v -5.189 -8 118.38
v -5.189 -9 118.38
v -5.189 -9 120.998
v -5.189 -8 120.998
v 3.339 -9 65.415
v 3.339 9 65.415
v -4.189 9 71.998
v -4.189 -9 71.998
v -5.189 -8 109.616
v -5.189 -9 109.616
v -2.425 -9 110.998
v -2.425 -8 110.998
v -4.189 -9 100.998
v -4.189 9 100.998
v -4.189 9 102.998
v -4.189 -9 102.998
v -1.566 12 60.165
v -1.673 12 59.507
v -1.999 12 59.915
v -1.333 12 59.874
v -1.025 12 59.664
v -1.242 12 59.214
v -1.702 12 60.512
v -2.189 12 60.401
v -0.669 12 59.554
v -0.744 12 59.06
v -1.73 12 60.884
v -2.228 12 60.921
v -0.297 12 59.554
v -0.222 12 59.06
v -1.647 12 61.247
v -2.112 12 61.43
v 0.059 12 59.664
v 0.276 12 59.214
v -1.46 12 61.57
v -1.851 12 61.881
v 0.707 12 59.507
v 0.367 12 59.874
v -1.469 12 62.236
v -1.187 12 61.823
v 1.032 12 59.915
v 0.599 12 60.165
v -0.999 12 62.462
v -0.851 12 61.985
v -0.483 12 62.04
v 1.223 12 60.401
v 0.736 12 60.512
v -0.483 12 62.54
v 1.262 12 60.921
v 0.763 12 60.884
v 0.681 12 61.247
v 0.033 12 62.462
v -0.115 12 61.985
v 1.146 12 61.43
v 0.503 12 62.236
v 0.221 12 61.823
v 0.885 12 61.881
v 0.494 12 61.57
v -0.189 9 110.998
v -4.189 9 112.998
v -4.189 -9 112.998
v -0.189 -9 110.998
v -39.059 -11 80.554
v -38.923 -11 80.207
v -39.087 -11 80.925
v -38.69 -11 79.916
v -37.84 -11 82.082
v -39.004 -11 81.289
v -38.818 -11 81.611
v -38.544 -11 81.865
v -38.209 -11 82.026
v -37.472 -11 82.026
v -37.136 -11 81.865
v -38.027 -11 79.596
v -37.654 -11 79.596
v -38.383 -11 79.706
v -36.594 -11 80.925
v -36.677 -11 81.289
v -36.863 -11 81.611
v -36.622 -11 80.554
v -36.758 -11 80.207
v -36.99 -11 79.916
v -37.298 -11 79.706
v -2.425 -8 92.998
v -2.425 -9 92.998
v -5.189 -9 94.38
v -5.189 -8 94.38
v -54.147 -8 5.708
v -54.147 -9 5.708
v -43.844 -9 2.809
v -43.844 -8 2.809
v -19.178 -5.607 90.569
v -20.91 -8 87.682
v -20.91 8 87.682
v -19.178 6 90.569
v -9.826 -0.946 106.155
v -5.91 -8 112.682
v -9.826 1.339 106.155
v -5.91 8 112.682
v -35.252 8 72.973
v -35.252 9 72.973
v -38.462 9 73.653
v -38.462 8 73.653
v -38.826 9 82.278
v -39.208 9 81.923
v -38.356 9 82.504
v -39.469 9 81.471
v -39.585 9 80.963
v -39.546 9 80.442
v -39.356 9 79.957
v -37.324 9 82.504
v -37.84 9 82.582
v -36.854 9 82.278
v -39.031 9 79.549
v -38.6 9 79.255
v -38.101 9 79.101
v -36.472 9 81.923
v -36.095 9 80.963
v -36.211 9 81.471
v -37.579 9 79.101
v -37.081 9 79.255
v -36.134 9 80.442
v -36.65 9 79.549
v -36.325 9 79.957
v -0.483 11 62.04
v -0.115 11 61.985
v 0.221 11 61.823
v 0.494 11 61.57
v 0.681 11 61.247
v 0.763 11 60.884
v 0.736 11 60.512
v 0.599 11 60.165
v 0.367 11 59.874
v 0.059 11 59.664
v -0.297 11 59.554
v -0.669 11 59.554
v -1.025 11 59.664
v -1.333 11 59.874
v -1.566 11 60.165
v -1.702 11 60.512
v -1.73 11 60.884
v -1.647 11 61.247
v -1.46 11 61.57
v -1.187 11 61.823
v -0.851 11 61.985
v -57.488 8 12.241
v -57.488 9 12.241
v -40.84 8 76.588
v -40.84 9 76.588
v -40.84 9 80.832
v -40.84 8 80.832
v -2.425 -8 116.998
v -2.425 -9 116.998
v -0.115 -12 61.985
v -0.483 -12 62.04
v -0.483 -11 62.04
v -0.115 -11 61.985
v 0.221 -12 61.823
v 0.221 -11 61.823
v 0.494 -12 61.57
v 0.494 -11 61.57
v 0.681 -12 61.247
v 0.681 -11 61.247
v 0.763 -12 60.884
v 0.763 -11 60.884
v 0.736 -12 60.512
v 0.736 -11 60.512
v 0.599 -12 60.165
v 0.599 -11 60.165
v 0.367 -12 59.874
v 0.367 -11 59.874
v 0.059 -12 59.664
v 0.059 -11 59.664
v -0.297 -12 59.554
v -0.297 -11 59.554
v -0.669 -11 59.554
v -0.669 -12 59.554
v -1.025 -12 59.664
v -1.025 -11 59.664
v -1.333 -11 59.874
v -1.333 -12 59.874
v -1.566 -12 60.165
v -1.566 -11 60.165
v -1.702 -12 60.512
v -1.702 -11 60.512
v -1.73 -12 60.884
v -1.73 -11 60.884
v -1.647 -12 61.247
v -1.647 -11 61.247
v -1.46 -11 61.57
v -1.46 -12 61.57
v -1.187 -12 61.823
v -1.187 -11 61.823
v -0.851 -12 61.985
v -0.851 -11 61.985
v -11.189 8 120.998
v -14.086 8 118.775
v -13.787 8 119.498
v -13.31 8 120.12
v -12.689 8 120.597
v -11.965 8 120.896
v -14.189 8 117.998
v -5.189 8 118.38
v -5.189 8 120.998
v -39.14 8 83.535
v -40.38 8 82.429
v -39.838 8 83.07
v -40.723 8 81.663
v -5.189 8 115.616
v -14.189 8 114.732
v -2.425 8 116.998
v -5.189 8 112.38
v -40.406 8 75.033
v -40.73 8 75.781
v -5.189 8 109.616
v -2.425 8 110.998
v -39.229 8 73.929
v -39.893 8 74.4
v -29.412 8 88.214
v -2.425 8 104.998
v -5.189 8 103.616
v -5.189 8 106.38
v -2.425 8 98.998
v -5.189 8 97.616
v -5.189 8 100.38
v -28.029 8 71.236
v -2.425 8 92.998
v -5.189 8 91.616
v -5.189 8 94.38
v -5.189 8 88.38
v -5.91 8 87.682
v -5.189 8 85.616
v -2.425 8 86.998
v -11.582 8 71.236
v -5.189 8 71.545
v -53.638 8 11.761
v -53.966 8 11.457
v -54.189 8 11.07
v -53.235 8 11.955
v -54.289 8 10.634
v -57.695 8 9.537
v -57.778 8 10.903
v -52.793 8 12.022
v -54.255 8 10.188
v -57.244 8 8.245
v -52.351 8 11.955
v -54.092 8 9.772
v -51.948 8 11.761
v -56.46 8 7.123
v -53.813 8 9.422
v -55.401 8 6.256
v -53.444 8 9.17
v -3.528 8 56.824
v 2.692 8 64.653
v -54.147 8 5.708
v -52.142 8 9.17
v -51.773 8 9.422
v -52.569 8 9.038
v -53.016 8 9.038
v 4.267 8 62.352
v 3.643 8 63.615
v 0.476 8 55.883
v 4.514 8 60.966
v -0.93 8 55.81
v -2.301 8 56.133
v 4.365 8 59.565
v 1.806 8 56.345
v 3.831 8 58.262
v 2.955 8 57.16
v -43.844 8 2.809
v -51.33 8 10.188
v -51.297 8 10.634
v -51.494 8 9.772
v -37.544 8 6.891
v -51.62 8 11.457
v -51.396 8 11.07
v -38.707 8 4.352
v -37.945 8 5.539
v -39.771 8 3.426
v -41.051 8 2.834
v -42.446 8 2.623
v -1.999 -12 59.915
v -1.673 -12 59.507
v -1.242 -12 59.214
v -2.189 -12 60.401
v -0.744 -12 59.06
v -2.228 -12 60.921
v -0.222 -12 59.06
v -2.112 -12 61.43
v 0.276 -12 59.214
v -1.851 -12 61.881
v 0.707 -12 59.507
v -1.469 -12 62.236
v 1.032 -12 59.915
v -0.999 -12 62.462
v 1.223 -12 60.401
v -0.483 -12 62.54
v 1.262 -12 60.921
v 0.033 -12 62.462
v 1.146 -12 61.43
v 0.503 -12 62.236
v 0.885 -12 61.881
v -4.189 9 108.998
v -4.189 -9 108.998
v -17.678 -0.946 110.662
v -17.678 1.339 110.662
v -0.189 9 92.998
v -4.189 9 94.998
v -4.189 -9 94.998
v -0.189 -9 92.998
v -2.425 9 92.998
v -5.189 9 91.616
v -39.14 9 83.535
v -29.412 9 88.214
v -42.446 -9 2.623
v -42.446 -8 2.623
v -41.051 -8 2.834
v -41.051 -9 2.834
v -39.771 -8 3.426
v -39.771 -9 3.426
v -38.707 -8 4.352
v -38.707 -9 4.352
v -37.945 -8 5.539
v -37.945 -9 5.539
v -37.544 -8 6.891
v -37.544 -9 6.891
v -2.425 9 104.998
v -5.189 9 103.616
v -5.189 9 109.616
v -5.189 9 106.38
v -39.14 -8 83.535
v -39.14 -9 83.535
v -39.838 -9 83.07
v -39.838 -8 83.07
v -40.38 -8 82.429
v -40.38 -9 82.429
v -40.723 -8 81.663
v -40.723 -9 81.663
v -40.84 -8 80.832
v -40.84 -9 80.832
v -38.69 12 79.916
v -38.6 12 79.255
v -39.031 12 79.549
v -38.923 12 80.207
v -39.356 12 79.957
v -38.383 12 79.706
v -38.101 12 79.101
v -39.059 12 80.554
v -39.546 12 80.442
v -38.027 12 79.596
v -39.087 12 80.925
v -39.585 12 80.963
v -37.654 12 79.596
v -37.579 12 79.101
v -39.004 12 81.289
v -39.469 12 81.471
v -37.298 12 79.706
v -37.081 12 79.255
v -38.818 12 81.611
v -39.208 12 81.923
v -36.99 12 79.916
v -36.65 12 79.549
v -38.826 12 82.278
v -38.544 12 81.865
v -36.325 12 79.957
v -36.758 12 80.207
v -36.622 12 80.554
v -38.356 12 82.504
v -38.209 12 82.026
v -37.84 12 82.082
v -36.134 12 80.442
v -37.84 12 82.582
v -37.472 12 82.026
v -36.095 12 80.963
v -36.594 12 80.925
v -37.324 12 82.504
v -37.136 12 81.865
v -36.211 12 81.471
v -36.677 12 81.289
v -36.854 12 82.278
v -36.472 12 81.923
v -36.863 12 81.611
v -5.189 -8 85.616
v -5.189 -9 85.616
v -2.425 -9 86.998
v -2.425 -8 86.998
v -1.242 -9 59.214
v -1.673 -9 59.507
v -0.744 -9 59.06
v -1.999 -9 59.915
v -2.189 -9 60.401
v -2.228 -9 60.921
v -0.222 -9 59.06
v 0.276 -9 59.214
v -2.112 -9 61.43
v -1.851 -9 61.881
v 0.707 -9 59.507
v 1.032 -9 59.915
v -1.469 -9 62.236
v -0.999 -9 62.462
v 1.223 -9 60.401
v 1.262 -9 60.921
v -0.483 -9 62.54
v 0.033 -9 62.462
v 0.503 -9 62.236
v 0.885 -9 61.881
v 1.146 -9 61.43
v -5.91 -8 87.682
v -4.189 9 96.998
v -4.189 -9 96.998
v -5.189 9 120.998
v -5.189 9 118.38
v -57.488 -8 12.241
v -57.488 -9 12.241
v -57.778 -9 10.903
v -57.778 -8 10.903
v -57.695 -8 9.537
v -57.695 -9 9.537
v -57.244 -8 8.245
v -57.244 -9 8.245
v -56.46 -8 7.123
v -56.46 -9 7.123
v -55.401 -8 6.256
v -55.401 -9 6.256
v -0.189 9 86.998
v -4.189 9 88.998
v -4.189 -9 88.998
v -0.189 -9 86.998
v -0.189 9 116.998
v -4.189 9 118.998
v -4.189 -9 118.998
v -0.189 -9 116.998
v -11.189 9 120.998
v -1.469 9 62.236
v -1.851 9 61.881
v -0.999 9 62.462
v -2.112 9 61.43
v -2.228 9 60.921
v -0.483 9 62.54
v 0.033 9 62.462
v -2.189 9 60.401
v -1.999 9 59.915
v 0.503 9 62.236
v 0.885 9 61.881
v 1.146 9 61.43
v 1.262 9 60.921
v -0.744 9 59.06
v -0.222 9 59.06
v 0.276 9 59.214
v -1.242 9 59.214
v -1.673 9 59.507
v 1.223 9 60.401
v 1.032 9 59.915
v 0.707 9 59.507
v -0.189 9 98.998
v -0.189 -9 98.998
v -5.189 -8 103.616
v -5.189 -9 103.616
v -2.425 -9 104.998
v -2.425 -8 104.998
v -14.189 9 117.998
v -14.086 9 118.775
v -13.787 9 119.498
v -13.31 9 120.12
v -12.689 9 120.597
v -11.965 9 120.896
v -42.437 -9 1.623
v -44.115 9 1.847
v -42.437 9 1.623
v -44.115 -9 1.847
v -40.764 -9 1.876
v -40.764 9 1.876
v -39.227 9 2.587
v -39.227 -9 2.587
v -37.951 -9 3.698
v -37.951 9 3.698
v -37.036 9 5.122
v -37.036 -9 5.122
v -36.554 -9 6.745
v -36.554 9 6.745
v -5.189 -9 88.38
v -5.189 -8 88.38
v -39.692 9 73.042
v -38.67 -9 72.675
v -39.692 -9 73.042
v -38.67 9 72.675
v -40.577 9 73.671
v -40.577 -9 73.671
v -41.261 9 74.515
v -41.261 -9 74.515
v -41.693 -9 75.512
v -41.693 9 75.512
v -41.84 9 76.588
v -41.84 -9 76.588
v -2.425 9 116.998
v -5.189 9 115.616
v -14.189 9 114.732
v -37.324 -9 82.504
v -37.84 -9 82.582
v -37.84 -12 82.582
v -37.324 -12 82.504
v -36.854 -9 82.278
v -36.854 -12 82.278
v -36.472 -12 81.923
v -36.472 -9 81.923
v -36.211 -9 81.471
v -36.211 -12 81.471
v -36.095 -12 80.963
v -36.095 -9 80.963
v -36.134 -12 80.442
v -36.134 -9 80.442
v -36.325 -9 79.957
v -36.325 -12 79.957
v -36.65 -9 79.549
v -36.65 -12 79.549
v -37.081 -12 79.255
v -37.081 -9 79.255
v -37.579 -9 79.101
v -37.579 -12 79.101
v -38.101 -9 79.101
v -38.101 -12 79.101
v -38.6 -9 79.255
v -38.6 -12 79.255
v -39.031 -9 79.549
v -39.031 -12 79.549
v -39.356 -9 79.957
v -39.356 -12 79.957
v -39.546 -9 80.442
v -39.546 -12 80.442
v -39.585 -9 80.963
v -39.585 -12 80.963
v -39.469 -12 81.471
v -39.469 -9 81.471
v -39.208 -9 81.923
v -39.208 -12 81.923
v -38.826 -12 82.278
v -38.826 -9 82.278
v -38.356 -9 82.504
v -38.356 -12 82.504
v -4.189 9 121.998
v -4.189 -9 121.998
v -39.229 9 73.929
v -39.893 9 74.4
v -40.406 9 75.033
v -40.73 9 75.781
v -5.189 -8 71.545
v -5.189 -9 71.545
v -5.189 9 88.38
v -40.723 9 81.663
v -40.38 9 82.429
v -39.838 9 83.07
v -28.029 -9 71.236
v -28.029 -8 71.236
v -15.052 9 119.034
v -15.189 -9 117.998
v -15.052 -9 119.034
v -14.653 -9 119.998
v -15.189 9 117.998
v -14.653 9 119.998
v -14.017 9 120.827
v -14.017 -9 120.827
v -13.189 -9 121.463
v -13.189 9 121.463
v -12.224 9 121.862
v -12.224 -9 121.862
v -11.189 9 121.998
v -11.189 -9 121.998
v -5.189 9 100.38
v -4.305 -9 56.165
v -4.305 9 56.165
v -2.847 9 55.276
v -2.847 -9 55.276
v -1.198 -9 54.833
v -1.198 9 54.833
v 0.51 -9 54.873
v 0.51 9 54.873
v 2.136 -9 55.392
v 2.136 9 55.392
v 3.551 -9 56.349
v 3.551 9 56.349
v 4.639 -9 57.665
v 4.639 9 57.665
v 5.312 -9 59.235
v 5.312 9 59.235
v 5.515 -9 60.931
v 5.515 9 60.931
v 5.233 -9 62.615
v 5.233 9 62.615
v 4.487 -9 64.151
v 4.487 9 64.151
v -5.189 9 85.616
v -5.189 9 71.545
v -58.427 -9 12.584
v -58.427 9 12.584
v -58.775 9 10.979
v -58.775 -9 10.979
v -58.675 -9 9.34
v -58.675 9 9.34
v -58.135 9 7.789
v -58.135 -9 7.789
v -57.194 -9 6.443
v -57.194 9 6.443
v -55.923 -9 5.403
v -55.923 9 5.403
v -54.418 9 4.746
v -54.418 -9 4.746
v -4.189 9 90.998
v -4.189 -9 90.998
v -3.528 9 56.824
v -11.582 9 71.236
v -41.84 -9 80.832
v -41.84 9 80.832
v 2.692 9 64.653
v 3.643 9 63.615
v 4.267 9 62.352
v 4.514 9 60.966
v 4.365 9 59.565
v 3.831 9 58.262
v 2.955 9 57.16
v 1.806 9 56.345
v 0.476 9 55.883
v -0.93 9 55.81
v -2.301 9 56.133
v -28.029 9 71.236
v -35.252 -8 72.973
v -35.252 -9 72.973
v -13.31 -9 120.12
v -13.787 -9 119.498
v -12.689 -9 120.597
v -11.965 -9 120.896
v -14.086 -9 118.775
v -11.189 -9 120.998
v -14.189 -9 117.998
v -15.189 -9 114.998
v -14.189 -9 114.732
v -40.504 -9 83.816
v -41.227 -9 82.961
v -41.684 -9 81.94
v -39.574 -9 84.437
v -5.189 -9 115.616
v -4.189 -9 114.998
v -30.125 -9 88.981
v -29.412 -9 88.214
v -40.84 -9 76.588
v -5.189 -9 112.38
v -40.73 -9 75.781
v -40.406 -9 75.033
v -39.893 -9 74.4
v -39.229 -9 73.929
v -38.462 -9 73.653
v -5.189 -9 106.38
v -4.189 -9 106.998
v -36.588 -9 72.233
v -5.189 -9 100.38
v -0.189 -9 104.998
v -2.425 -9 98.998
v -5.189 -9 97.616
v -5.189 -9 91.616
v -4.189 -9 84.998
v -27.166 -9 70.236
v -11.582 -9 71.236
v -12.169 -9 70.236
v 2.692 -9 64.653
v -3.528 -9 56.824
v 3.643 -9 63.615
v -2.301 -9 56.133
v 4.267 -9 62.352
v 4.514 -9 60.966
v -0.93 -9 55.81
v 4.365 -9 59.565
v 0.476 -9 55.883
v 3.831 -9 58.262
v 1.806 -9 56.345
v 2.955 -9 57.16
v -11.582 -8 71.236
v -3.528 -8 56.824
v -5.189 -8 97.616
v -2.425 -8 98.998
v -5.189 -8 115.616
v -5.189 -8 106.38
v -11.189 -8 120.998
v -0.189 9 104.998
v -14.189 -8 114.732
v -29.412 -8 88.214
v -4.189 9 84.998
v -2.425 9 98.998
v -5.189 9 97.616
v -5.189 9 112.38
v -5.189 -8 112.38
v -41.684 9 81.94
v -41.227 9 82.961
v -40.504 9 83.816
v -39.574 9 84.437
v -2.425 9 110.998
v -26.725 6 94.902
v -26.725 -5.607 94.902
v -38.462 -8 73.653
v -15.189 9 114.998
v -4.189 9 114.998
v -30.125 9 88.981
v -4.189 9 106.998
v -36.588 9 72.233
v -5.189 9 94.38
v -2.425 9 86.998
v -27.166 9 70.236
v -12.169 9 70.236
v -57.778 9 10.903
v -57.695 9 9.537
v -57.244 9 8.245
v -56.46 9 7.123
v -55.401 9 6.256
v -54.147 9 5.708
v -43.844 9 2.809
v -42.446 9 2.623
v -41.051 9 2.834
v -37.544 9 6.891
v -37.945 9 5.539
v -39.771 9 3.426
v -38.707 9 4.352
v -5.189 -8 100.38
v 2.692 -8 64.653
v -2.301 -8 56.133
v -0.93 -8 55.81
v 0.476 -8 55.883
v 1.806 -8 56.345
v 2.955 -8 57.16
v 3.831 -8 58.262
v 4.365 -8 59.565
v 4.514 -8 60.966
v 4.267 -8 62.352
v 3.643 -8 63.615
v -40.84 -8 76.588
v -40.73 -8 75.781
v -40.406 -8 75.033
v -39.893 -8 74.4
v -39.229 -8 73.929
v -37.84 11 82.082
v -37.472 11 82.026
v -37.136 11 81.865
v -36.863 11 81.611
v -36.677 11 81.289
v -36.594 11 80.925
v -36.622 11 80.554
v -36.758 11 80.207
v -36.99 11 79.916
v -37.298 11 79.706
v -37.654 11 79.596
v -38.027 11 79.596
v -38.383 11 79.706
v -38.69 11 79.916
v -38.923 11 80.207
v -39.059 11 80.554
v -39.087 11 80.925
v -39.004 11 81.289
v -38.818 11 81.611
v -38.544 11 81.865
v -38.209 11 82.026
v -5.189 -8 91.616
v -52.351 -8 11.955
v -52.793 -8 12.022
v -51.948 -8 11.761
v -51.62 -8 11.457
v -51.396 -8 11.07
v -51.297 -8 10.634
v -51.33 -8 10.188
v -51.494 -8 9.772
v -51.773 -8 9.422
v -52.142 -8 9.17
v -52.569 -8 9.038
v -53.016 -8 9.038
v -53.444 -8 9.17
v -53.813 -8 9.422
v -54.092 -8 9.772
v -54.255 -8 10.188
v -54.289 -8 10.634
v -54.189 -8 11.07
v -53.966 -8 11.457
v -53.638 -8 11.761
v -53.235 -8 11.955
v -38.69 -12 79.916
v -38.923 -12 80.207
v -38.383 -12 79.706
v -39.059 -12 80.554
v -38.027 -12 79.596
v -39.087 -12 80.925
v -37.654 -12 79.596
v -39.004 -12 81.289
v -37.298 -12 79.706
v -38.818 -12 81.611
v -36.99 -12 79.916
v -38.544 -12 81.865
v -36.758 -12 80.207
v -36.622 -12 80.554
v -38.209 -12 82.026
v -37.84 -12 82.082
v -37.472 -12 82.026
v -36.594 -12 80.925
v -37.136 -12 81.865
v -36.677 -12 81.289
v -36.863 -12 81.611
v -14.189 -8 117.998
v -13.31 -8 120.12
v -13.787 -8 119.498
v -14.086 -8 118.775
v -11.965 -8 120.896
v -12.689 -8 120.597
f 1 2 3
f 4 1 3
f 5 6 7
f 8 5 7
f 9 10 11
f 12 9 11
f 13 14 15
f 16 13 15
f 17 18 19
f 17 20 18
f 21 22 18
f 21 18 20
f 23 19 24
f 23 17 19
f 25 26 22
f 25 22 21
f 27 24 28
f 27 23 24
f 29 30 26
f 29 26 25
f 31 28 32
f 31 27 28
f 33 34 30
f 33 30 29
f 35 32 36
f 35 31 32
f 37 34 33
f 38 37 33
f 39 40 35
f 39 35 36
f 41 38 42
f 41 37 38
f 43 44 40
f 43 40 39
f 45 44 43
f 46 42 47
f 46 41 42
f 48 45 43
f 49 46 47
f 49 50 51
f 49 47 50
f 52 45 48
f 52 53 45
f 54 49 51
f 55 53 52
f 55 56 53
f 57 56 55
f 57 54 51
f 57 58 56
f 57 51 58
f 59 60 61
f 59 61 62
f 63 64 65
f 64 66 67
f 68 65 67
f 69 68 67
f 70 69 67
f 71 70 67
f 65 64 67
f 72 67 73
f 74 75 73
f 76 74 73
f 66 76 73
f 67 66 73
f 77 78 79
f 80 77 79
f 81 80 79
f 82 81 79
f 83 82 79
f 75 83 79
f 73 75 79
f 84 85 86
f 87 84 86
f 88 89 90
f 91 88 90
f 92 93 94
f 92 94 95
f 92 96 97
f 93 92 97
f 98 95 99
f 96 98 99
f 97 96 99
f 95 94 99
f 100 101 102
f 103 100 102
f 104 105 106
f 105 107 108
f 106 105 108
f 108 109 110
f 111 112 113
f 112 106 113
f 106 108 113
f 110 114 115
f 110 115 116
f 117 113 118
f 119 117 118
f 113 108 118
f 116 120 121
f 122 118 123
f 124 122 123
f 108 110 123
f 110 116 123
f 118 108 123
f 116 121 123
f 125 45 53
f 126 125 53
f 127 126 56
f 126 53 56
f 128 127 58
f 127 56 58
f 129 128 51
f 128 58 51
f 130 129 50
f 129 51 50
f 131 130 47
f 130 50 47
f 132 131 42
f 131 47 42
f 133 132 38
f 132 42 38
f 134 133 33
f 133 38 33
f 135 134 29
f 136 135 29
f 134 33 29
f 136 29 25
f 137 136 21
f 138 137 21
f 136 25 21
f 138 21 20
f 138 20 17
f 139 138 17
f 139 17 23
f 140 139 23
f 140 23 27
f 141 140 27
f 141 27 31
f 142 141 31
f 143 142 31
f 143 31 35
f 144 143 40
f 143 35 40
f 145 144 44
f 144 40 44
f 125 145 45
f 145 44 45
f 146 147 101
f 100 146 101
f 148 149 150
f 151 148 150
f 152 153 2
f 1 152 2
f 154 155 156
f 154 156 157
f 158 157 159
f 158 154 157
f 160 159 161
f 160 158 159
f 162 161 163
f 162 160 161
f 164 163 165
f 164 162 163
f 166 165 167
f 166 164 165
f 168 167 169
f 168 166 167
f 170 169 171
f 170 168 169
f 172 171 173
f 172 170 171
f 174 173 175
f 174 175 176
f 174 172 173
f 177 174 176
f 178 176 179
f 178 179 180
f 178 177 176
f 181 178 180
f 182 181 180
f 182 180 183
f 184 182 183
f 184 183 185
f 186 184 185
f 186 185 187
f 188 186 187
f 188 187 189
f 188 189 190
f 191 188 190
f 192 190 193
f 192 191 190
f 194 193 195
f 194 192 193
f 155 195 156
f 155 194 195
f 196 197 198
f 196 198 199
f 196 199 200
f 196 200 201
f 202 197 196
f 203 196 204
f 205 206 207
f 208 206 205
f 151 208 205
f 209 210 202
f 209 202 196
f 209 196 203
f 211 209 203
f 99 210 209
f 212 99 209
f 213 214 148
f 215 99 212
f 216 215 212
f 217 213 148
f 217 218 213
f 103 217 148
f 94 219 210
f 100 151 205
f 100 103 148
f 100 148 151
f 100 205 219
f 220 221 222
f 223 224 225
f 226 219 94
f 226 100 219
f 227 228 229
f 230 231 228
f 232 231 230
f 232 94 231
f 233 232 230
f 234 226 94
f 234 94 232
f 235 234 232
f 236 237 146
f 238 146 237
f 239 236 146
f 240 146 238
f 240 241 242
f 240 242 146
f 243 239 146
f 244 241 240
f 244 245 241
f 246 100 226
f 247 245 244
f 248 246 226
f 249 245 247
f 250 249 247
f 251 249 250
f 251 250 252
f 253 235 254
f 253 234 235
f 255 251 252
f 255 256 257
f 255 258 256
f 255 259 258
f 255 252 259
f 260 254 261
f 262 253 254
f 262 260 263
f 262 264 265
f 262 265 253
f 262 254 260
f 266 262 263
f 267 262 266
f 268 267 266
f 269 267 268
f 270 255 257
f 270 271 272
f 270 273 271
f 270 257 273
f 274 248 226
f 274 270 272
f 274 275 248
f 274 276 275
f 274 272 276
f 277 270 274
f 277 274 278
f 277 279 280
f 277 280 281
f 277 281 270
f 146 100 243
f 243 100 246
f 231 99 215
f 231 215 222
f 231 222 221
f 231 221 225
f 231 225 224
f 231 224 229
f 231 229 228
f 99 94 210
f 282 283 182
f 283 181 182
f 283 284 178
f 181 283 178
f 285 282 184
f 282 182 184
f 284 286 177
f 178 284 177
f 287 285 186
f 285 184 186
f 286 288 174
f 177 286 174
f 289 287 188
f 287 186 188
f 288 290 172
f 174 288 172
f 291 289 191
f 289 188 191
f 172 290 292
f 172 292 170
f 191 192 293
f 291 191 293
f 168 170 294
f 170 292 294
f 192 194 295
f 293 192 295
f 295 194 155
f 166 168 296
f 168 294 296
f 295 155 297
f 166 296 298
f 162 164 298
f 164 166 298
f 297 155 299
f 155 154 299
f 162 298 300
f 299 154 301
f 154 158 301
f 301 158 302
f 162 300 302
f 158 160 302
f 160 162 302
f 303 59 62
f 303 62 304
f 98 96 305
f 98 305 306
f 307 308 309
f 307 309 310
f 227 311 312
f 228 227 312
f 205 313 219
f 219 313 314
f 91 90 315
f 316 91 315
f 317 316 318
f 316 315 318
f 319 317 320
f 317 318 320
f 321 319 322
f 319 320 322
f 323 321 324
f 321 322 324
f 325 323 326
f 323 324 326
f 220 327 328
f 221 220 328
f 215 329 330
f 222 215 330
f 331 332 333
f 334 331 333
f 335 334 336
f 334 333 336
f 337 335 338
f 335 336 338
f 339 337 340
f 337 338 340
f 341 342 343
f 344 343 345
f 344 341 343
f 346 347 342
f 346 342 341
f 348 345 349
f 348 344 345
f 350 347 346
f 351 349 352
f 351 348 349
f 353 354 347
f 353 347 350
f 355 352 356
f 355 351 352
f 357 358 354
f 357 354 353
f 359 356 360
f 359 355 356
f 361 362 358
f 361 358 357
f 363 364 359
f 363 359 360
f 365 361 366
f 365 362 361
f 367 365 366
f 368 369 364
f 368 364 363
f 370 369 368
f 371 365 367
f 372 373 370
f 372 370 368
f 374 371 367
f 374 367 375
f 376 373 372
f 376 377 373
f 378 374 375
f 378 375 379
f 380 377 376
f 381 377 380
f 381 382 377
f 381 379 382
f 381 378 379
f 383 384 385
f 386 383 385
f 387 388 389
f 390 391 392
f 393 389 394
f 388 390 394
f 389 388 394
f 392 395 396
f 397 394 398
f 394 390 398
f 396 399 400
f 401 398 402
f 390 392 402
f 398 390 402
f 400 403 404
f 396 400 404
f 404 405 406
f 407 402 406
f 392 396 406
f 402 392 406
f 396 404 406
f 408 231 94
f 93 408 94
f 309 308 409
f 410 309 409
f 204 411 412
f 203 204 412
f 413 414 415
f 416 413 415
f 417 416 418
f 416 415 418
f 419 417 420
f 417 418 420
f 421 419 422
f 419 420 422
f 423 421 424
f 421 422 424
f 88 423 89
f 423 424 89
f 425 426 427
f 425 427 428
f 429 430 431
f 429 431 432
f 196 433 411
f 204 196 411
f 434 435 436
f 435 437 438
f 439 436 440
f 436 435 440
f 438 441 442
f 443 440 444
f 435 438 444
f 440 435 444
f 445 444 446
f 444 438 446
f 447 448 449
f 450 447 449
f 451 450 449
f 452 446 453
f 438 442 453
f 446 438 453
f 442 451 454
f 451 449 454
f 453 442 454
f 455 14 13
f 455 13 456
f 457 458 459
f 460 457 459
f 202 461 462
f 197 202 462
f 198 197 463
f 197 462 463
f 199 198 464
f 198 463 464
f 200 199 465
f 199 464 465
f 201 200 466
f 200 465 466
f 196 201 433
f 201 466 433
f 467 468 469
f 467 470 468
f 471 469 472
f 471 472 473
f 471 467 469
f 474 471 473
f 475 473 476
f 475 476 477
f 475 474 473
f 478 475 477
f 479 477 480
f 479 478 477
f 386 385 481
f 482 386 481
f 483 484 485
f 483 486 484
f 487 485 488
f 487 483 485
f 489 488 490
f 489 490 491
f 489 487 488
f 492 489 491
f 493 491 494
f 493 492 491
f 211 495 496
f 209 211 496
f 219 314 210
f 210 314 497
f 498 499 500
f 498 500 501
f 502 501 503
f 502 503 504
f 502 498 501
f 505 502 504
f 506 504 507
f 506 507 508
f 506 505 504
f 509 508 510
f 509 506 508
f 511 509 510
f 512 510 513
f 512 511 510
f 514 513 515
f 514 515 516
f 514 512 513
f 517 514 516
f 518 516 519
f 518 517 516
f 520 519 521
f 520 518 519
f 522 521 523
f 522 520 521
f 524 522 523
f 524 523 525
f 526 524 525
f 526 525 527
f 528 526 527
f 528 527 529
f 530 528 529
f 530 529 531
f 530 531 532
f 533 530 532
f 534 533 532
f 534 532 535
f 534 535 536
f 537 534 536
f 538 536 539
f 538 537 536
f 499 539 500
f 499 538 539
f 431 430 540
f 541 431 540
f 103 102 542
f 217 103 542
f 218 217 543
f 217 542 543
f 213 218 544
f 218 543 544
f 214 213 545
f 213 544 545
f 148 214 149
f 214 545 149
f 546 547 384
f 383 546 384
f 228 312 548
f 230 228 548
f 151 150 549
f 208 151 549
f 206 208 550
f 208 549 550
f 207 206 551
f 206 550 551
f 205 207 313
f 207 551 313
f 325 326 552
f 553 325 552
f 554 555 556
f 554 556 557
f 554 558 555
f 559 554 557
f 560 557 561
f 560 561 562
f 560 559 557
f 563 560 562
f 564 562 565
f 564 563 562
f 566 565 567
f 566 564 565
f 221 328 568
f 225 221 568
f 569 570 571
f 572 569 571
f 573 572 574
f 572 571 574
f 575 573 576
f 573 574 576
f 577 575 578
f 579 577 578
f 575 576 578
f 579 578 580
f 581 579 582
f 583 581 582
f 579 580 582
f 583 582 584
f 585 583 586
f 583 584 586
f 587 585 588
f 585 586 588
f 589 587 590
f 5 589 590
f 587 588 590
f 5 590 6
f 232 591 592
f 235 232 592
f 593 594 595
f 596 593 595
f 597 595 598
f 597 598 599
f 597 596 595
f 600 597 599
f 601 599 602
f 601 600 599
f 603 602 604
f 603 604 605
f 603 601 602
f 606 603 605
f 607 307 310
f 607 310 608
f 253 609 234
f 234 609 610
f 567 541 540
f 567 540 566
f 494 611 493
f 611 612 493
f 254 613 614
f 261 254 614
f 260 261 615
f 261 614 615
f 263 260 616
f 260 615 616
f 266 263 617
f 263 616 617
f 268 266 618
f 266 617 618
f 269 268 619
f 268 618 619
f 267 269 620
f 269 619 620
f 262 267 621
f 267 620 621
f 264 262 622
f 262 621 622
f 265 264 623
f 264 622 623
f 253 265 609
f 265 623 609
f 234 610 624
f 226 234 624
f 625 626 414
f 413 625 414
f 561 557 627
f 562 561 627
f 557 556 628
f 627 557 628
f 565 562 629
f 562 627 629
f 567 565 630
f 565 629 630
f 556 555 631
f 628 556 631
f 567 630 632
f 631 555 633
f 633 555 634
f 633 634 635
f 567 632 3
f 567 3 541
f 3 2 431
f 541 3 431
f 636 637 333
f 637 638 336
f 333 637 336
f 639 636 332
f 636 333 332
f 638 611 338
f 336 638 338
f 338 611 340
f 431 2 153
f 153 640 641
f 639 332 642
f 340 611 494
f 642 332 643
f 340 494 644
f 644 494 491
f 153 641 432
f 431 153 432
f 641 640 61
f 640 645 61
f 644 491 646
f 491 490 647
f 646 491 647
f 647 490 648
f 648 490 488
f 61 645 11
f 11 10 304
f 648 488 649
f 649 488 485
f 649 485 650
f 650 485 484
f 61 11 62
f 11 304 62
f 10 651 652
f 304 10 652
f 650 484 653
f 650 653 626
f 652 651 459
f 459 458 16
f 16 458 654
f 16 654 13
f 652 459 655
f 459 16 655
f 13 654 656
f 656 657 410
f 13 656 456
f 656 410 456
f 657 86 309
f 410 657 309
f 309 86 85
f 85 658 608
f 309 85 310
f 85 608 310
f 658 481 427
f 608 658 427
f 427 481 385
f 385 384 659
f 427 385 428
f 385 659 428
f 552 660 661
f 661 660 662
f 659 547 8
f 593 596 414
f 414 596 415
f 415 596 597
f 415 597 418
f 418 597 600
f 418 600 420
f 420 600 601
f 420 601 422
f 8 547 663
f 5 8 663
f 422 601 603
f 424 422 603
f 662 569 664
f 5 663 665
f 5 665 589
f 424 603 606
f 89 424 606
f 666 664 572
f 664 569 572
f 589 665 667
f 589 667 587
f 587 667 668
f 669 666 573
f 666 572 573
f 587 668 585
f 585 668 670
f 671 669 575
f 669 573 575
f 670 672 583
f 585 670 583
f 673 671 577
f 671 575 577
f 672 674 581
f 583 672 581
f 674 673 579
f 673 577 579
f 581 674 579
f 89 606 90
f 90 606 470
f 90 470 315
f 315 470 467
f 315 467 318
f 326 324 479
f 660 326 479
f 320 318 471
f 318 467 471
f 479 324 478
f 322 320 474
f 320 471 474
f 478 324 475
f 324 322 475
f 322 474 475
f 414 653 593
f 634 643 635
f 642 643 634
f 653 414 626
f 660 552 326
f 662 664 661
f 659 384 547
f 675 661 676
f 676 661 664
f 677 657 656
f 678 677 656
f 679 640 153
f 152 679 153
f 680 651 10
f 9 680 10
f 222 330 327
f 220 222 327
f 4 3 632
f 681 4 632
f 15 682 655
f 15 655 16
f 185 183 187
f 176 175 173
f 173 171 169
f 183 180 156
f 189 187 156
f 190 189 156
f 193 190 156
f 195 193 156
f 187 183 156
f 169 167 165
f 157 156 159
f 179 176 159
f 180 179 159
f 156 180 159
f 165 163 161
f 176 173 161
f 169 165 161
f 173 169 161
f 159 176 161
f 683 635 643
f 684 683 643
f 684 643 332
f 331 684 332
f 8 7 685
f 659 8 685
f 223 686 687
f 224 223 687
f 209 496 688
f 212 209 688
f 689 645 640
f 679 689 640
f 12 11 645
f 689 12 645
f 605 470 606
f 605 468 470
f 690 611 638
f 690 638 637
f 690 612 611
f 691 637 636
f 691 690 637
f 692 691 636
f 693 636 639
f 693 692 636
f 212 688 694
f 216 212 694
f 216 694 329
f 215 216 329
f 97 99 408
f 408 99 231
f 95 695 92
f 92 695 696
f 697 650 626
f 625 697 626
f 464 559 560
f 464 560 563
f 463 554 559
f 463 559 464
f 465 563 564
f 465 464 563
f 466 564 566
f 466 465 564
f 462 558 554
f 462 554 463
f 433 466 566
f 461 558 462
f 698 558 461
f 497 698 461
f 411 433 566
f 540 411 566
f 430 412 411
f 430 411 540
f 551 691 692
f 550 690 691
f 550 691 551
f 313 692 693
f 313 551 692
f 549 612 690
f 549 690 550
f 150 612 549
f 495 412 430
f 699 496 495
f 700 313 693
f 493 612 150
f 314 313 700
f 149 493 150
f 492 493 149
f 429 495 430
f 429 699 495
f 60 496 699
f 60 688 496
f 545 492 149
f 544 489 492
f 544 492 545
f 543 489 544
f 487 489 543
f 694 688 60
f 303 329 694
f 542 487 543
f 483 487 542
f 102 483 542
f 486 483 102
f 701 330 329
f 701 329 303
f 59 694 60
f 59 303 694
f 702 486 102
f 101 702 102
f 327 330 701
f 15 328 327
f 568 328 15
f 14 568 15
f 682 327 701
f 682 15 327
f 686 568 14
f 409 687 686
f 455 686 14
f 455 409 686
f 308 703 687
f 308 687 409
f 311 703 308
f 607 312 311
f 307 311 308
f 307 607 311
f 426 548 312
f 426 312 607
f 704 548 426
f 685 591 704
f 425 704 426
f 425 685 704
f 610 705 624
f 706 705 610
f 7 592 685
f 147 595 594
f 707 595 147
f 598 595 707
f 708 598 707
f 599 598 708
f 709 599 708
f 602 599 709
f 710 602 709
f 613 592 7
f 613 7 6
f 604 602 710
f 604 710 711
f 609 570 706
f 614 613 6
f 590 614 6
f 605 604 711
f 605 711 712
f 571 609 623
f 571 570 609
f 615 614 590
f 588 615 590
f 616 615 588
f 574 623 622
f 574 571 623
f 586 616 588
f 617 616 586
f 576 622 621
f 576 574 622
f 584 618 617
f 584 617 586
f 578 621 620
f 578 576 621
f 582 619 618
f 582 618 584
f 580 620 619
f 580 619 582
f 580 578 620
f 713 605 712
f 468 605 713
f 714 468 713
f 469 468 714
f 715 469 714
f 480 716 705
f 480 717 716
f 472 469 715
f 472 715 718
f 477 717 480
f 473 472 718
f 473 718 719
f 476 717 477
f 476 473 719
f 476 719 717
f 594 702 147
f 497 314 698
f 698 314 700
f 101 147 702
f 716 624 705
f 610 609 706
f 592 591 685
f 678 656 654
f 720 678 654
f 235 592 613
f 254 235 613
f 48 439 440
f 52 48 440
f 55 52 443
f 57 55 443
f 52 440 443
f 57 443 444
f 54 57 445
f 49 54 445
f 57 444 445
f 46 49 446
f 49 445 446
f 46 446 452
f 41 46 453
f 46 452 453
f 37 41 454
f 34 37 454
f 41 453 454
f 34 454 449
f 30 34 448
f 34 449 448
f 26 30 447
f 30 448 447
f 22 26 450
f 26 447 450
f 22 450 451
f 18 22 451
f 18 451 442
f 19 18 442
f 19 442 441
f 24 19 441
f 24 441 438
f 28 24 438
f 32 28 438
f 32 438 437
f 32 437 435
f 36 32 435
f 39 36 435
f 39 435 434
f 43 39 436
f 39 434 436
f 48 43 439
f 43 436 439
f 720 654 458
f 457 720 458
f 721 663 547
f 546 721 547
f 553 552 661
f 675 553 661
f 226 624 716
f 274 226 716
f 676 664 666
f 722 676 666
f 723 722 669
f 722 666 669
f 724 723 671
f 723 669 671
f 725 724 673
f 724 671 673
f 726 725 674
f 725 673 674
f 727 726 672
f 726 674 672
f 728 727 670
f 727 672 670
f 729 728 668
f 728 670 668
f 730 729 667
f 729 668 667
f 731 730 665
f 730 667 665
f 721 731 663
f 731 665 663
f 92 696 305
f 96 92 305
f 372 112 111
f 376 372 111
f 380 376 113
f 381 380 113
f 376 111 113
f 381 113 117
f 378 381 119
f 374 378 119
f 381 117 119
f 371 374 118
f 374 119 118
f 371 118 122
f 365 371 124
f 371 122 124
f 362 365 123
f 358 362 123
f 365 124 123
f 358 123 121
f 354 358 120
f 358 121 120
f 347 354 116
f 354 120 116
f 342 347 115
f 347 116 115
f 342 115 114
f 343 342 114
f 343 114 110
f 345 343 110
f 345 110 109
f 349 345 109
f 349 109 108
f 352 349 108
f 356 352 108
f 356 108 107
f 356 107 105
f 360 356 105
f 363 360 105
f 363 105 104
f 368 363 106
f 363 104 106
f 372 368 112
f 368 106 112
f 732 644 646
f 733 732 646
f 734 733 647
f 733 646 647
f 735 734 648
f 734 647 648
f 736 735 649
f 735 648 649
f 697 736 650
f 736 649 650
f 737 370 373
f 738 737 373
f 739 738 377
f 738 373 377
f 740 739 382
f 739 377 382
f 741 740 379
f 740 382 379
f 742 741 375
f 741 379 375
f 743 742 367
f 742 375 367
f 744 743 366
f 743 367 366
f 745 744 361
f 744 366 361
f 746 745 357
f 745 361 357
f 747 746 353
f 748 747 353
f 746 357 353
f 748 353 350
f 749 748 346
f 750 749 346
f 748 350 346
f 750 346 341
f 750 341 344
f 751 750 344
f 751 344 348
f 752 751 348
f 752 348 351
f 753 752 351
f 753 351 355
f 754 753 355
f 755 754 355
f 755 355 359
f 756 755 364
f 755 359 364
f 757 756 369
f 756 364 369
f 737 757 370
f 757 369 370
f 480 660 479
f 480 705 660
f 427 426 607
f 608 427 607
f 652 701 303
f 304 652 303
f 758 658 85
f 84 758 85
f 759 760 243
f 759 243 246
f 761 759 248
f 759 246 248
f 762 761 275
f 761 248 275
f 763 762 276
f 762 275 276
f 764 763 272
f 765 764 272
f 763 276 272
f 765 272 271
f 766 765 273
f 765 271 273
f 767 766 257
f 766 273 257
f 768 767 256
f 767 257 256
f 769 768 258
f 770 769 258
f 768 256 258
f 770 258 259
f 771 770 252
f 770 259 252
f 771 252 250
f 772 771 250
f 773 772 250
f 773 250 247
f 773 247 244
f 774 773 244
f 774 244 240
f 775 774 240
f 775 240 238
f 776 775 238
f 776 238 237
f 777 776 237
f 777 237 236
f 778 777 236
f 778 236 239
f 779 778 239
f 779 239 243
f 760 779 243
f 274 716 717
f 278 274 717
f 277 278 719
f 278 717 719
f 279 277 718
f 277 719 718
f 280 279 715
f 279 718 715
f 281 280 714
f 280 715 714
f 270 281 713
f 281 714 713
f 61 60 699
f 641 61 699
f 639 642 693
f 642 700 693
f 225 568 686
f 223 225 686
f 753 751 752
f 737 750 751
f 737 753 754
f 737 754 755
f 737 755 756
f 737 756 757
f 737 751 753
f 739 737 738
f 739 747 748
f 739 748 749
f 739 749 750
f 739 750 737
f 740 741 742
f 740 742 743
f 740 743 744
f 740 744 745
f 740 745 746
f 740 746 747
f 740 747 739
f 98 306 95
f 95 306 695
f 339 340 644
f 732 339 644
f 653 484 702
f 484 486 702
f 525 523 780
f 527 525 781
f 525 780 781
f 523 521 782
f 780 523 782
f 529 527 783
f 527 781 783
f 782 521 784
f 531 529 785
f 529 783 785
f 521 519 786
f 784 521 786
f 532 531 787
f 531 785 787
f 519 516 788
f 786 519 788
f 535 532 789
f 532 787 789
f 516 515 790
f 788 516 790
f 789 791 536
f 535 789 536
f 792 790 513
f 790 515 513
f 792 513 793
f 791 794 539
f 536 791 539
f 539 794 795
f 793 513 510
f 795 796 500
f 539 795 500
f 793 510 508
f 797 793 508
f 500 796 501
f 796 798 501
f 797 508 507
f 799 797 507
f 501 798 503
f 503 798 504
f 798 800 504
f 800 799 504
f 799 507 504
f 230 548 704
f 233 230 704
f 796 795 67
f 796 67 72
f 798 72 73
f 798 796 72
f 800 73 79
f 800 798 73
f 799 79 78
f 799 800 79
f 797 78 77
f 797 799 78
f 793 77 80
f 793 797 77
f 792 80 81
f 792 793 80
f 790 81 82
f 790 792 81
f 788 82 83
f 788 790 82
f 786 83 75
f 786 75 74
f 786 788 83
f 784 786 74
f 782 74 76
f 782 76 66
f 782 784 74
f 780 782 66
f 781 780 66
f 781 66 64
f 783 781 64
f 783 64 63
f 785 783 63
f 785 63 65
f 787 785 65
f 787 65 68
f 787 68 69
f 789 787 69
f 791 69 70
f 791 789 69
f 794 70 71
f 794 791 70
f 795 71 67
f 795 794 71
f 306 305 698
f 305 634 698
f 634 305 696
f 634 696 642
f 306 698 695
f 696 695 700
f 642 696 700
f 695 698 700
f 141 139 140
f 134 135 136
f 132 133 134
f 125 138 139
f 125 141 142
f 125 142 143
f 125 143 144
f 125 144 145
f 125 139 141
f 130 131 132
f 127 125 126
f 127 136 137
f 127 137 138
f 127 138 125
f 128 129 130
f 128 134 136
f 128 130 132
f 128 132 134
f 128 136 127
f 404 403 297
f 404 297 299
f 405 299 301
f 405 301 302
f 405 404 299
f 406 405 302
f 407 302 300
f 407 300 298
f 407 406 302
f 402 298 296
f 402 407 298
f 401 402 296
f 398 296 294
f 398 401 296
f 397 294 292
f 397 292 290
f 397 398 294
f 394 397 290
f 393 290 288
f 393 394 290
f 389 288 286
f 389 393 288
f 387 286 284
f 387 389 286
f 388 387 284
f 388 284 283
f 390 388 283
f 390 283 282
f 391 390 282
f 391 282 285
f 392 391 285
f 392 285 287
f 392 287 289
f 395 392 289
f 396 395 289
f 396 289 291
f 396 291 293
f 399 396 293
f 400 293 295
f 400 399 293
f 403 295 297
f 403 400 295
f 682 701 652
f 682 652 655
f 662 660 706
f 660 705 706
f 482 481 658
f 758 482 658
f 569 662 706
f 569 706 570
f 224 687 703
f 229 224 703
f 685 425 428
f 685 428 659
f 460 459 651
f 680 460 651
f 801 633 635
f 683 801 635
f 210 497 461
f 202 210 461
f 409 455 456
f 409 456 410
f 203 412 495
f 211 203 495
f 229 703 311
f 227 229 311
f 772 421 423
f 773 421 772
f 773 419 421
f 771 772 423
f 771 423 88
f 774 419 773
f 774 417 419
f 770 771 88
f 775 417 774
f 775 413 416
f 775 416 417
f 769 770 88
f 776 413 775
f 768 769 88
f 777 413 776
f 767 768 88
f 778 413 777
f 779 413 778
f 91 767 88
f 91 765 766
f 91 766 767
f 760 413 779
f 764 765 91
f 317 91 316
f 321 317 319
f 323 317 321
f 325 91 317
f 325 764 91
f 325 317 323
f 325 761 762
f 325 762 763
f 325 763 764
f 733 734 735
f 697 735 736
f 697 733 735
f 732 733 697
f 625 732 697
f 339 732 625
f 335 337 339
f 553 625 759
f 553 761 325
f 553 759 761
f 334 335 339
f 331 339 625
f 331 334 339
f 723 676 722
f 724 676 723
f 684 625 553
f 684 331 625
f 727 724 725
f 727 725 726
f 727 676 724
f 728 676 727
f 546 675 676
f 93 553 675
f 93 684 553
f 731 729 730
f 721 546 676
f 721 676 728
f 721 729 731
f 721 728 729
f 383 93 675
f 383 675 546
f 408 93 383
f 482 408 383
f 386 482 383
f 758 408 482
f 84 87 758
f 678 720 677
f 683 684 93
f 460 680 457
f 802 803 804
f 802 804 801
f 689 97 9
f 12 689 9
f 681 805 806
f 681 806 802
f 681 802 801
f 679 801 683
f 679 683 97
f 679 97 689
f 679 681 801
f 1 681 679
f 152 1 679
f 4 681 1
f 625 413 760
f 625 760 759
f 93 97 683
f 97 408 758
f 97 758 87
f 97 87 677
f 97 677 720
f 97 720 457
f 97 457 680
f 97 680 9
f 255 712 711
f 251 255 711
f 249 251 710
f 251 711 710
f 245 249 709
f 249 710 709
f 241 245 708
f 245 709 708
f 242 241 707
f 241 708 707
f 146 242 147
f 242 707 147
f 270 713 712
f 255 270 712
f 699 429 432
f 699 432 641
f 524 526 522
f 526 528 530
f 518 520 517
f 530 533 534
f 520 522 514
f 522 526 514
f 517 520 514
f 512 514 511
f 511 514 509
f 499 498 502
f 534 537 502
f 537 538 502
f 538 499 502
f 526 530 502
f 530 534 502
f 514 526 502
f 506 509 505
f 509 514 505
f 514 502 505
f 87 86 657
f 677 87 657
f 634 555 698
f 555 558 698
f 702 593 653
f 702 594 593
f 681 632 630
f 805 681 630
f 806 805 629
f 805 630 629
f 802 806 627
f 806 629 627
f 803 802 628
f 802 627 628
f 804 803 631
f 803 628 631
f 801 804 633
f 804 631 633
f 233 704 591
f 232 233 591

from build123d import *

# Parameters (mm, degrees)
BOSS_EXTRUDE1_DEPTH = 9
FILLET1_R           = 6
FILLET2_R           = 4
BOSS_EXTRUDE2_DEPTH = 18
LPATTERN1_COUNT     = 6
LPATTERN1_PITCH     = 6
CUT_EXTRUDE1_DEPTH  = 26
CUT_EXTRUDE2_DEPTH  = 12
SKETCH6_R           = 1.5
CUT_EXTRUDE3_DEPTH  = 137.617023851
SKETCH7_R           = 1.75
BOSS_EXTRUDE3_DEPTH = 3
SKETCH8_R           = 1.25
CUT_EXTRUDE4_DEPTH  = 1
SKETCH9_R           = 1.25
CUT_EXTRUDE5_DEPTH  = 1
CUT_EXTRUDE6_DEPTH  = 1
CUT_EXTRUDE8_DEPTH  = 1


with BuildPart() as part:
    # Sketch1 → Boss-Extrude1 (new, symmetric)
    with BuildSketch(Plane(origin=(0, 0, 0), x_dir=(1, 0, 0), z_dir=(0, 1, 0))):
        Polygon((-60.65446174, -6.500648573), (-36.587825561, -72.233418354), (-27.166266267, -70.236347784), (-37.55161412, 0), align=None)
        with BuildLine():
            ThreePointArc((-4.305064826, -56.165075387), (4.142121149, -56.968224871), (3.338971664, -65.415410847))
            Line((3.338971664, -65.415410847), (-4.18856152, -71.998437822))
            Line((-4.18856152, -71.998437822), (-4.18856152, -121.998437822))
            Line((-4.18856152, -121.998437822), (-15.18856152, -121.998437822))
            Line((-15.18856152, -121.998437822), (-15.18856152, -114.998437822))
            Line((-15.18856152, -114.998437822), (-30.124544277, -88.980820347))
            Line((-30.124544277, -88.980820347), (-41.840233878, -83.346761671))
            Line((-41.840233878, -83.346761671), (-41.840233878, -73.346761671))
            Line((-41.840233878, -73.346761671), (-27.166266267, -70.236347784))
            Line((-27.166266267, -70.236347784), (-12.168992483, -70.236347784))
            Line((-12.168992483, -70.236347784), (-4.305064826, -56.165075387))
        make_face()
    extrude(amount=BOSS_EXTRUDE1_DEPTH, both=True)

    # Fillet1
    fillet1_edges = [part.edges().sort_by_distance(p)[0] for p in [
        (-60.65446174, 0, 6.500648573),
        (-37.55161412, 0, 0),
    ]]
    fillet(fillet1_edges, radius=FILLET1_R)

    # Fillet2
    fillet2_edges = [part.edges().sort_by_distance(p)[0] for p in [
        (-15.18856152, 0, 121.998437822),
        (-41.840233878, 0, 83.346761671),
        (-41.840233878, 0, 73.346761671),
    ]]
    fillet(fillet2_edges, radius=FILLET2_R)

    # Sketch2 → Boss-Extrude2 (add)
    with BuildSketch(Plane(origin=(0, 9, 0), x_dir=(1, 0, 0), z_dir=(0, 1, 0))):
        Polygon((-4.18856152, -114.998437822), (-4.18856152, -118.998437822), (-0.18856152, -116.998437822), align=None)
    boss_extrude2 = extrude(amount=-BOSS_EXTRUDE2_DEPTH)

    # LPattern1: Boss-Extrude2 ×6
    with Locations(*[(0, 0, -i * LPATTERN1_PITCH) for i in range(1, LPATTERN1_COUNT)]):
        add(boss_extrude2)

    # Sketch3 → Cut-Extrude1 (cut)
    with BuildSketch(Plane(origin=(0, 9, 0), x_dir=(1, 0, 0), z_dir=(0, 1, 0))):
        Polygon((-5.910062362, -112.681899409), (-5.910062362, -87.681899409), (-20.910062362, -87.681899409), align=None)
    extrude(amount=-CUT_EXTRUDE1_DEPTH, mode=Mode.SUBTRACT)

    # Sketch5 → Cut-Extrude2 (cut)
    with BuildSketch(Plane(origin=(-61.077365003, 0, 35.062798175), x_dir=(0.49786609189148234, 0, 0.8672539158428183), z_dir=(-0.8672539158428184, 0, 0.4978660918914824))):
        Polygon((68.998311862, 6), (68.998311862, -5.607055646), (87.170975752, -0.946478308), (87.170975752, 1.339422662), align=None)
    extrude(amount=-CUT_EXTRUDE2_DEPTH, mode=Mode.SUBTRACT)

    # Sketch6 → Cut-Extrude3 (cut, through all)
    with BuildSketch(Plane(origin=(0, 9, 0), x_dir=(1, 0, 0), z_dir=(0, 1, 0))):
        with Locations(Location((-52.79279186, -10.521540216, 0), (0, 0, 270))):
            Circle(SKETCH6_R)
    extrude(amount=-CUT_EXTRUDE3_DEPTH, mode=Mode.SUBTRACT)

    # Sketch7 → Boss-Extrude3 (add)
    with BuildSketch(Plane(origin=(0, 9, 0), x_dir=(1, 0, 0), z_dir=(0, 1, 0))):
        with Locations(Location((-37.840233878, -80.83186359, 0), (0, 0, 270))):
            Circle(SKETCH7_R)
        with Locations(Location((-0.483046581, -60.790243117, 0), (0, 0, 270))):
            Circle(SKETCH7_R)
    boss_extrude3 = extrude(amount=BOSS_EXTRUDE3_DEPTH)

    # Sketch8 → Cut-Extrude4 (cut)
    with BuildSketch(Plane(origin=(0, 12, 0), x_dir=(1, 0, 0), z_dir=(0, 1, 0))):
        with Locations(Location((-37.840233878, -80.83186359, 0), (0, 0, 270))):
            Circle(SKETCH8_R)
    cut_extrude4 = extrude(amount=-CUT_EXTRUDE4_DEPTH, mode=Mode.SUBTRACT)

    # Sketch9 → Cut-Extrude5 (cut)
    with BuildSketch(Plane(origin=(0, 12, 0), x_dir=(1, 0, 0), z_dir=(0, 1, 0))):
        with Locations(Location((-0.483046581, -60.790243117, 0), (0, 0, 270))):
            Circle(SKETCH9_R)
    cut_extrude5 = extrude(amount=-CUT_EXTRUDE5_DEPTH, mode=Mode.SUBTRACT)

    # Sketch10 → Cut-Extrude6 (cut)
    with BuildSketch(Plane(origin=(0, 9, 0), x_dir=(1, 0, 0), z_dir=(0, 1, 0))):
        with BuildLine():
            Line((-14.18856152, -114.731807726), (-14.18856152, -117.998437822))
            ThreePointArc((-14.18856152, -117.998437822), (-13.309881864, -120.119758166), (-11.18856152, -120.998437822))
            Line((-11.18856152, -120.998437822), (-5.18856152, -120.998437822))
            Line((-5.18856152, -120.998437822), (-5.18856152, -118.380403833))
            Line((-5.18856152, -118.380403833), (-2.424629498, -116.998437822))
            Line((-2.424629498, -116.998437822), (-5.18856152, -115.616471811))
            Line((-5.18856152, -115.616471811), (-5.18856152, -112.380403833))
            Line((-5.18856152, -112.380403833), (-2.424629498, -110.998437822))
            Line((-2.424629498, -110.998437822), (-5.18856152, -109.616471811))
            Line((-5.18856152, -109.616471811), (-5.18856152, -106.380403833))
            Line((-5.18856152, -106.380403833), (-2.424629498, -104.998437822))
            Line((-2.424629498, -104.998437822), (-5.18856152, -103.616471811))
            Line((-5.18856152, -103.616471811), (-5.18856152, -100.380403833))
            Line((-5.18856152, -100.380403833), (-2.424629498, -98.998437822))
            Line((-2.424629498, -98.998437822), (-5.18856152, -97.616471811))
            Line((-5.18856152, -97.616471811), (-5.18856152, -94.380403833))
            Line((-5.18856152, -94.380403833), (-2.424629498, -92.998437822))
            Line((-2.424629498, -92.998437822), (-5.18856152, -91.616471811))
            Line((-5.18856152, -91.616471811), (-5.18856152, -88.380403833))
            Line((-5.18856152, -88.380403833), (-2.424629498, -86.998437822))
            Line((-2.424629498, -86.998437822), (-5.18856152, -85.616471811))
            Line((-5.18856152, -85.616471811), (-5.18856152, -71.544507837))
            Line((-5.18856152, -71.544507837), (2.691671648, -64.653035393))
            ThreePointArc((2.691671648, -64.653035393), (3.431869226, -57.680028619), (-3.527901716, -56.824280786))
            Line((-3.527901716, -56.824280786), (-11.582287208, -71.236347784))
            Line((-11.582287208, -71.236347784), (-28.029276006, -71.236347784))
            Line((-28.029276006, -71.236347784), (-37.543545046, -6.891126164))
            ThreePointArc((-37.543545046, -6.891126164), (-39.771200268, -3.426133551), (-43.844068507, -2.809395435))
            Line((-43.844068507, -2.809395435), (-54.147093646, -5.708446962))
            ThreePointArc((-54.147093646, -5.708446962), (-57.244344446, -8.244770667), (-57.487989702, -12.240585657))
            Line((-57.487989702, -12.240585657), (-35.252291992, -72.972546184))
            Line((-35.252291992, -72.972546184), (-38.462316656, -73.6529692))
            ThreePointArc((-38.462316656, -73.6529692), (-40.171140175, -74.699145282), (-40.840233878, -76.587762722))
            Line((-40.840233878, -76.587762722), (-40.840233878, -80.83186359))
            ThreePointArc((-40.840233878, -80.83186359), (-40.379968329, -82.428656914), (-39.140401265, -83.535484267))
            Line((-39.140401265, -83.535484267), (-29.411682997, -88.214011219))
            Line((-29.411682997, -88.214011219), (-14.18856152, -114.731807726))
        make_face()
    extrude(amount=-CUT_EXTRUDE6_DEPTH, mode=Mode.SUBTRACT)


with BuildPart() as cut_extrude6_piece_1:
    # of the separate pieces the step leaves, piece 1, a body of its own (cut_extrude6_pieces)
    add(part.part.solids().sort_by_distance((-38.669677582, -9, 72.674704692))[0])

    # Mirror4: Boss-Extrude3, Cut-Extrude4, Cut-Extrude5 across plane
    add(boss_extrude3.mirror(Plane.ZX))
    add(cut_extrude4.mirror(Plane.ZX), mode=Mode.SUBTRACT)
    add(cut_extrude5.mirror(Plane.ZX), mode=Mode.SUBTRACT)

    # Sketch12 → Cut-Extrude8 (cut)
    with BuildSketch(Plane.XZ.offset(9)):
        with BuildLine():
            Line((-5.18856152, 120.998437822), (-11.18856152, 120.998437822))
            ThreePointArc((-11.18856152, 120.998437822), (-13.309881864, 120.119758166), (-14.18856152, 117.998437822))
            Line((-14.18856152, 117.998437822), (-14.18856152, 114.731807726))
            Line((-14.18856152, 114.731807726), (-29.411682997, 88.214011219))
            Line((-29.411682997, 88.214011219), (-39.140401265, 83.535484267))
            ThreePointArc((-39.140401265, 83.535484267), (-40.379968329, 82.428656914), (-40.840233878, 80.83186359))
            Line((-40.840233878, 80.83186359), (-40.840233878, 76.587762722))
            ThreePointArc((-40.840233878, 76.587762722), (-40.171140175, 74.699145282), (-38.462316656, 73.6529692))
            Line((-38.462316656, 73.6529692), (-35.252291992, 72.972546184))
            Line((-35.252291992, 72.972546184), (-57.487989702, 12.240585657))
            ThreePointArc((-57.487989702, 12.240585657), (-57.244344446, 8.244770667), (-54.147093646, 5.708446962))
            Line((-54.147093646, 5.708446962), (-43.844068507, 2.809395435))
            ThreePointArc((-43.844068507, 2.809395435), (-39.771200268, 3.426133551), (-37.543545046, 6.891126164))
            Line((-37.543545046, 6.891126164), (-28.029276006, 71.236347784))
            Line((-28.029276006, 71.236347784), (-11.582287208, 71.236347784))
            Line((-11.582287208, 71.236347784), (-3.527901716, 56.824280786))
            ThreePointArc((-3.527901716, 56.824280786), (3.431869226, 57.680028619), (2.691671648, 64.653035393))
            Line((2.691671648, 64.653035393), (-5.18856152, 71.544507837))
            Line((-5.18856152, 71.544507837), (-5.18856152, 85.616471811))
            Line((-5.18856152, 85.616471811), (-2.424629498, 86.998437822))
            Line((-2.424629498, 86.998437822), (-5.18856152, 88.380403833))
            Line((-5.18856152, 88.380403833), (-5.18856152, 91.616471811))
            Line((-5.18856152, 91.616471811), (-2.424629498, 92.998437822))
            Line((-2.424629498, 92.998437822), (-5.18856152, 94.380403833))
            Line((-5.18856152, 94.380403833), (-5.18856152, 97.616471811))
            Line((-5.18856152, 97.616471811), (-2.424629498, 98.998437822))
            Line((-2.424629498, 98.998437822), (-5.18856152, 100.380403833))
            Line((-5.18856152, 100.380403833), (-5.18856152, 103.616471811))
            Line((-5.18856152, 103.616471811), (-2.424629498, 104.998437822))
            Line((-2.424629498, 104.998437822), (-5.18856152, 106.380403833))
            Line((-5.18856152, 106.380403833), (-5.18856152, 109.616471811))
            Line((-5.18856152, 109.616471811), (-2.424629498, 110.998437822))
            Line((-2.424629498, 110.998437822), (-5.18856152, 112.380403833))
            Line((-5.18856152, 112.380403833), (-5.18856152, 115.616471811))
            Line((-5.18856152, 115.616471811), (-2.424629498, 116.998437822))
            Line((-2.424629498, 116.998437822), (-5.18856152, 118.380403833))
            Line((-5.18856152, 118.380403833), (-5.18856152, 120.998437822))
        make_face()
    extrude(amount=-CUT_EXTRUDE8_DEPTH, mode=Mode.SUBTRACT)


with BuildPart() as cut_extrude6_piece_2:
    # of the separate pieces the step leaves, piece 2, a body of its own (cut_extrude6_pieces)
    add(part.part.solids().sort_by_distance((-37.840233878, 9, 82.58186359))[0])


with BuildPart() as cut_extrude6_piece_3:
    # of the separate pieces the step leaves, piece 3, a body of its own (cut_extrude6_pieces)
    add(part.part.solids().sort_by_distance((-0.483046581, 9, 62.540243117))[0])


with BuildPart() as cut_extrude8_piece_1:
    # of the separate pieces the step leaves, piece 1, a body of its own (cut_extrude8_pieces)
    add(cut_extrude6_piece_1.part.solids().sort_by_distance((-38.669677582, -9, 72.674704692))[0])


with BuildPart() as cut_extrude8_piece_2:
    # of the separate pieces the step leaves, piece 2, a body of its own (cut_extrude8_pieces)
    add(cut_extrude6_piece_1.part.solids().sort_by_distance((-37.840233878, -9, 82.58186359))[0])


with BuildPart() as cut_extrude8_piece_3:
    # of the separate pieces the step leaves, piece 3, a body of its own (cut_extrude8_pieces)
    add(cut_extrude6_piece_1.part.solids().sort_by_distance((-0.483046581, -9, 62.540243117))[0])


solid = Compound([cut_extrude6_piece_2.part, cut_extrude6_piece_3.part, cut_extrude8_piece_1.part, cut_extrude8_piece_2.part, cut_extrude8_piece_3.part])
